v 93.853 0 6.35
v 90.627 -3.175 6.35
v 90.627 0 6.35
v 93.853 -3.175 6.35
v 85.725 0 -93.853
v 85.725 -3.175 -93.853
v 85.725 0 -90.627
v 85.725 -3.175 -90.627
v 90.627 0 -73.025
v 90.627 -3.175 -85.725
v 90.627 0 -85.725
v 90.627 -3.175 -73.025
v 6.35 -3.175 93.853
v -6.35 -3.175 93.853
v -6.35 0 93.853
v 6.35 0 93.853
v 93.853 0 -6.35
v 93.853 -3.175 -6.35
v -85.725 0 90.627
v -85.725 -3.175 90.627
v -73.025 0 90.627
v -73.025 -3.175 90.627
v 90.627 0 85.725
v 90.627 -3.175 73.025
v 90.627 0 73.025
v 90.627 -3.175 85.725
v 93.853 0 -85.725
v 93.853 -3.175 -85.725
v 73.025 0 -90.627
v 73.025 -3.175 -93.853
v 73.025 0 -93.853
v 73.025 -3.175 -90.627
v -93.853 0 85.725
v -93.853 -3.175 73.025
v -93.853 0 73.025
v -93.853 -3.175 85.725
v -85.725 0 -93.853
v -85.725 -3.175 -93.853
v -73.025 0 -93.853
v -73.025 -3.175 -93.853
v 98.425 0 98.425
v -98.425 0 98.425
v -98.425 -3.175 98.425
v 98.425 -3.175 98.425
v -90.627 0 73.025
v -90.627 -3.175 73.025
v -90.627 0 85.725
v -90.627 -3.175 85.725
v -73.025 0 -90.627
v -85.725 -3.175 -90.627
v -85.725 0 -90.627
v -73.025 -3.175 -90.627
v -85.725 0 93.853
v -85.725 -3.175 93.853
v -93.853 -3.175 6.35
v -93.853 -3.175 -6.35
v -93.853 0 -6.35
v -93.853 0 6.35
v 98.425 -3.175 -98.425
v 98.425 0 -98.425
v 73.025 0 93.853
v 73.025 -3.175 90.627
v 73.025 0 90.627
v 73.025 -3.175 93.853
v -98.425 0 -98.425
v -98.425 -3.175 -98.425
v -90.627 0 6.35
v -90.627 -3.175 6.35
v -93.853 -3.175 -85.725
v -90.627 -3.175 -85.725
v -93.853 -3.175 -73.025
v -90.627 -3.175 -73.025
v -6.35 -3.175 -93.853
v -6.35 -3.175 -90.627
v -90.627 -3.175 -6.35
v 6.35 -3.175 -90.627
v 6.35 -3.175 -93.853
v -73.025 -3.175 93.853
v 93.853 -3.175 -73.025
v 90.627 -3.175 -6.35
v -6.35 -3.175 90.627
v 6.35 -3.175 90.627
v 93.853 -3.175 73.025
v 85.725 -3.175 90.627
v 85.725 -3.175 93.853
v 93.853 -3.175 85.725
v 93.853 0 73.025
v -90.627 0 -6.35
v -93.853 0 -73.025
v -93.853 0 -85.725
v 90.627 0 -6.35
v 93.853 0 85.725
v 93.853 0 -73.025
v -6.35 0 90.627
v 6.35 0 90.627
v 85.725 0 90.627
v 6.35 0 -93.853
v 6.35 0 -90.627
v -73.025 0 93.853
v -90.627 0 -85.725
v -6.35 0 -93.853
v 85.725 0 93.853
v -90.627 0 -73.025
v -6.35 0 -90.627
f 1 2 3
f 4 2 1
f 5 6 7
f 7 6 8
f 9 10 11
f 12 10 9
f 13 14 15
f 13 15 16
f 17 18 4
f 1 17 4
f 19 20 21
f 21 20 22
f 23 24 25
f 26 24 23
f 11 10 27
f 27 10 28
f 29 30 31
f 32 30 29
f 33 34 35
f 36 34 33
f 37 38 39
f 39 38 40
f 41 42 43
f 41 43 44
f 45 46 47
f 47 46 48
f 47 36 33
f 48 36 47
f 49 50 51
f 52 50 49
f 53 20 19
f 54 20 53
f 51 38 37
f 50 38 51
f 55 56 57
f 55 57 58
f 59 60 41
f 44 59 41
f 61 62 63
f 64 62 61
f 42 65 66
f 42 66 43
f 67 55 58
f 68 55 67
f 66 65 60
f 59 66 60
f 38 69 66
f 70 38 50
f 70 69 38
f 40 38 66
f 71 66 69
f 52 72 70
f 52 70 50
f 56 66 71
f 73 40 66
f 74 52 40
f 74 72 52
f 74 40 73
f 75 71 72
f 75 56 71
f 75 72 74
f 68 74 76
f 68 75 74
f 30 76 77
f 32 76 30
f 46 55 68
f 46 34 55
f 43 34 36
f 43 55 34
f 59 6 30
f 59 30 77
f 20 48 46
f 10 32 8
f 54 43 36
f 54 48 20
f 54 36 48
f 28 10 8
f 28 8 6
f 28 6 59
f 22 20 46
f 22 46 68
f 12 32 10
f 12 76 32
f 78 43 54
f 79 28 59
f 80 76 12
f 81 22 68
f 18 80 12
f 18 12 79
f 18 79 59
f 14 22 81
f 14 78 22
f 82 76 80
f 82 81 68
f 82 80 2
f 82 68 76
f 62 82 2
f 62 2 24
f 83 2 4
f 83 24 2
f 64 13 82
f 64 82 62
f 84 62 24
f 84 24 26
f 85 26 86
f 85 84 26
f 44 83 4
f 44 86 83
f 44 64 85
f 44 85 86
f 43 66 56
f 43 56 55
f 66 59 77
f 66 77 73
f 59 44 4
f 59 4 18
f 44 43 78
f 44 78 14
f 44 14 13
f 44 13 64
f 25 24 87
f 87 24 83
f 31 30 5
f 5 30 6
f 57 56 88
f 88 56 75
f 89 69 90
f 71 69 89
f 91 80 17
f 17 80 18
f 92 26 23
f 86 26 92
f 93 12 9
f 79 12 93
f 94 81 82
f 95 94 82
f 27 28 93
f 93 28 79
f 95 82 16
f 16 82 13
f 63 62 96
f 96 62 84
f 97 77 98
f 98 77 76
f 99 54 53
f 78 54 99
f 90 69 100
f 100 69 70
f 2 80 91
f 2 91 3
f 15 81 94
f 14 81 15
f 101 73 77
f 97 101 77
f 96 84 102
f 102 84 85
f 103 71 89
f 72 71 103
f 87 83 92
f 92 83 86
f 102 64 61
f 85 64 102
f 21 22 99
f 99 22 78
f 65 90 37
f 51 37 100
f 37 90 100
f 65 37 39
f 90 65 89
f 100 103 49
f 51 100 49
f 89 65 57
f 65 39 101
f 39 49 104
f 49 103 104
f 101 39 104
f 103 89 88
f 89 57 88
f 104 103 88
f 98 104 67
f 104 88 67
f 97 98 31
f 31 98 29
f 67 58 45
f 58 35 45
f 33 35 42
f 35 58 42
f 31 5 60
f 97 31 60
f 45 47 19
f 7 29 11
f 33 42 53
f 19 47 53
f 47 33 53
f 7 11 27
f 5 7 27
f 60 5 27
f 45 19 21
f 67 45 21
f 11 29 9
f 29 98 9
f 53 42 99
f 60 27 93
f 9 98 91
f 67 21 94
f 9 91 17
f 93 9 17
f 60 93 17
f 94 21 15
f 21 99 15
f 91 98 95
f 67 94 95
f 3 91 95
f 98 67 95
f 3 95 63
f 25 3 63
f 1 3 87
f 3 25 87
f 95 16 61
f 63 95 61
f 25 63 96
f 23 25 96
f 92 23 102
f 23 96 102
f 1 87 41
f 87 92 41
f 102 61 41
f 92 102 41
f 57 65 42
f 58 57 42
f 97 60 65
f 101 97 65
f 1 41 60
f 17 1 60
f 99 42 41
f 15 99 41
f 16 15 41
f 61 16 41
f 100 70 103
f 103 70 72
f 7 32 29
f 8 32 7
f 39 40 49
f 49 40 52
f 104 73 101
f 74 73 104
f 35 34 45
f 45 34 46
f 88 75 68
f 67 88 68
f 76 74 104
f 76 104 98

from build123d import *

# Parameters (mm, degrees)
F0_W     = 196.85
F0_H     = 196.85
F1_DEPTH = 3.175
F2_W     = 12.7
F2_H     = 3.2258
F2_W_2   = 3.2258
F2_H_2   = 12.7
F3_DEPTH = 3.175


with BuildPart() as f1:
    # F0 (on Front) → F1 (new body)
    with BuildSketch(Plane.XZ):
        Rectangle(F0_W, F0_H)
    extrude(amount=F1_DEPTH)

    # F2 (on face) → F3 (cut)
    with BuildSketch(Plane.XZ.offset(3.175)):
        with Locations((79.375, -92.2401)):
            Rectangle(F2_W, F2_H)
        with Locations((92.2401, 79.375)):
            Rectangle(F2_W_2, F2_H_2)
        with Locations((92.2401, -79.375)):
            Rectangle(F2_W_2, F2_H_2)
        with Locations((0, -92.2401)):
            Rectangle(F2_W, F2_H)
        with Locations((92.2401, 0)):
            Rectangle(F2_W_2, F2_H_2)
        with Locations((-79.375, -92.2401)):
            Rectangle(F2_W, F2_H)
        with Locations((-92.2401, 79.375)):
            Rectangle(F2_W_2, F2_H_2)
        with Locations((-92.2401, -79.375)):
            Rectangle(F2_W_2, F2_H_2)
        with Locations((-92.2401, 0)):
            Rectangle(F2_W_2, F2_H_2)
        with Locations((-79.375, 92.2401)):
            Rectangle(F2_W, F2_H)
        with Locations((0, 92.2401)):
            Rectangle(F2_W, F2_H)
        with Locations((79.375, 92.2401)):
            Rectangle(F2_W, F2_H)
    extrude(amount=-F3_DEPTH, mode=Mode.SUBTRACT)


solid = f1.part
